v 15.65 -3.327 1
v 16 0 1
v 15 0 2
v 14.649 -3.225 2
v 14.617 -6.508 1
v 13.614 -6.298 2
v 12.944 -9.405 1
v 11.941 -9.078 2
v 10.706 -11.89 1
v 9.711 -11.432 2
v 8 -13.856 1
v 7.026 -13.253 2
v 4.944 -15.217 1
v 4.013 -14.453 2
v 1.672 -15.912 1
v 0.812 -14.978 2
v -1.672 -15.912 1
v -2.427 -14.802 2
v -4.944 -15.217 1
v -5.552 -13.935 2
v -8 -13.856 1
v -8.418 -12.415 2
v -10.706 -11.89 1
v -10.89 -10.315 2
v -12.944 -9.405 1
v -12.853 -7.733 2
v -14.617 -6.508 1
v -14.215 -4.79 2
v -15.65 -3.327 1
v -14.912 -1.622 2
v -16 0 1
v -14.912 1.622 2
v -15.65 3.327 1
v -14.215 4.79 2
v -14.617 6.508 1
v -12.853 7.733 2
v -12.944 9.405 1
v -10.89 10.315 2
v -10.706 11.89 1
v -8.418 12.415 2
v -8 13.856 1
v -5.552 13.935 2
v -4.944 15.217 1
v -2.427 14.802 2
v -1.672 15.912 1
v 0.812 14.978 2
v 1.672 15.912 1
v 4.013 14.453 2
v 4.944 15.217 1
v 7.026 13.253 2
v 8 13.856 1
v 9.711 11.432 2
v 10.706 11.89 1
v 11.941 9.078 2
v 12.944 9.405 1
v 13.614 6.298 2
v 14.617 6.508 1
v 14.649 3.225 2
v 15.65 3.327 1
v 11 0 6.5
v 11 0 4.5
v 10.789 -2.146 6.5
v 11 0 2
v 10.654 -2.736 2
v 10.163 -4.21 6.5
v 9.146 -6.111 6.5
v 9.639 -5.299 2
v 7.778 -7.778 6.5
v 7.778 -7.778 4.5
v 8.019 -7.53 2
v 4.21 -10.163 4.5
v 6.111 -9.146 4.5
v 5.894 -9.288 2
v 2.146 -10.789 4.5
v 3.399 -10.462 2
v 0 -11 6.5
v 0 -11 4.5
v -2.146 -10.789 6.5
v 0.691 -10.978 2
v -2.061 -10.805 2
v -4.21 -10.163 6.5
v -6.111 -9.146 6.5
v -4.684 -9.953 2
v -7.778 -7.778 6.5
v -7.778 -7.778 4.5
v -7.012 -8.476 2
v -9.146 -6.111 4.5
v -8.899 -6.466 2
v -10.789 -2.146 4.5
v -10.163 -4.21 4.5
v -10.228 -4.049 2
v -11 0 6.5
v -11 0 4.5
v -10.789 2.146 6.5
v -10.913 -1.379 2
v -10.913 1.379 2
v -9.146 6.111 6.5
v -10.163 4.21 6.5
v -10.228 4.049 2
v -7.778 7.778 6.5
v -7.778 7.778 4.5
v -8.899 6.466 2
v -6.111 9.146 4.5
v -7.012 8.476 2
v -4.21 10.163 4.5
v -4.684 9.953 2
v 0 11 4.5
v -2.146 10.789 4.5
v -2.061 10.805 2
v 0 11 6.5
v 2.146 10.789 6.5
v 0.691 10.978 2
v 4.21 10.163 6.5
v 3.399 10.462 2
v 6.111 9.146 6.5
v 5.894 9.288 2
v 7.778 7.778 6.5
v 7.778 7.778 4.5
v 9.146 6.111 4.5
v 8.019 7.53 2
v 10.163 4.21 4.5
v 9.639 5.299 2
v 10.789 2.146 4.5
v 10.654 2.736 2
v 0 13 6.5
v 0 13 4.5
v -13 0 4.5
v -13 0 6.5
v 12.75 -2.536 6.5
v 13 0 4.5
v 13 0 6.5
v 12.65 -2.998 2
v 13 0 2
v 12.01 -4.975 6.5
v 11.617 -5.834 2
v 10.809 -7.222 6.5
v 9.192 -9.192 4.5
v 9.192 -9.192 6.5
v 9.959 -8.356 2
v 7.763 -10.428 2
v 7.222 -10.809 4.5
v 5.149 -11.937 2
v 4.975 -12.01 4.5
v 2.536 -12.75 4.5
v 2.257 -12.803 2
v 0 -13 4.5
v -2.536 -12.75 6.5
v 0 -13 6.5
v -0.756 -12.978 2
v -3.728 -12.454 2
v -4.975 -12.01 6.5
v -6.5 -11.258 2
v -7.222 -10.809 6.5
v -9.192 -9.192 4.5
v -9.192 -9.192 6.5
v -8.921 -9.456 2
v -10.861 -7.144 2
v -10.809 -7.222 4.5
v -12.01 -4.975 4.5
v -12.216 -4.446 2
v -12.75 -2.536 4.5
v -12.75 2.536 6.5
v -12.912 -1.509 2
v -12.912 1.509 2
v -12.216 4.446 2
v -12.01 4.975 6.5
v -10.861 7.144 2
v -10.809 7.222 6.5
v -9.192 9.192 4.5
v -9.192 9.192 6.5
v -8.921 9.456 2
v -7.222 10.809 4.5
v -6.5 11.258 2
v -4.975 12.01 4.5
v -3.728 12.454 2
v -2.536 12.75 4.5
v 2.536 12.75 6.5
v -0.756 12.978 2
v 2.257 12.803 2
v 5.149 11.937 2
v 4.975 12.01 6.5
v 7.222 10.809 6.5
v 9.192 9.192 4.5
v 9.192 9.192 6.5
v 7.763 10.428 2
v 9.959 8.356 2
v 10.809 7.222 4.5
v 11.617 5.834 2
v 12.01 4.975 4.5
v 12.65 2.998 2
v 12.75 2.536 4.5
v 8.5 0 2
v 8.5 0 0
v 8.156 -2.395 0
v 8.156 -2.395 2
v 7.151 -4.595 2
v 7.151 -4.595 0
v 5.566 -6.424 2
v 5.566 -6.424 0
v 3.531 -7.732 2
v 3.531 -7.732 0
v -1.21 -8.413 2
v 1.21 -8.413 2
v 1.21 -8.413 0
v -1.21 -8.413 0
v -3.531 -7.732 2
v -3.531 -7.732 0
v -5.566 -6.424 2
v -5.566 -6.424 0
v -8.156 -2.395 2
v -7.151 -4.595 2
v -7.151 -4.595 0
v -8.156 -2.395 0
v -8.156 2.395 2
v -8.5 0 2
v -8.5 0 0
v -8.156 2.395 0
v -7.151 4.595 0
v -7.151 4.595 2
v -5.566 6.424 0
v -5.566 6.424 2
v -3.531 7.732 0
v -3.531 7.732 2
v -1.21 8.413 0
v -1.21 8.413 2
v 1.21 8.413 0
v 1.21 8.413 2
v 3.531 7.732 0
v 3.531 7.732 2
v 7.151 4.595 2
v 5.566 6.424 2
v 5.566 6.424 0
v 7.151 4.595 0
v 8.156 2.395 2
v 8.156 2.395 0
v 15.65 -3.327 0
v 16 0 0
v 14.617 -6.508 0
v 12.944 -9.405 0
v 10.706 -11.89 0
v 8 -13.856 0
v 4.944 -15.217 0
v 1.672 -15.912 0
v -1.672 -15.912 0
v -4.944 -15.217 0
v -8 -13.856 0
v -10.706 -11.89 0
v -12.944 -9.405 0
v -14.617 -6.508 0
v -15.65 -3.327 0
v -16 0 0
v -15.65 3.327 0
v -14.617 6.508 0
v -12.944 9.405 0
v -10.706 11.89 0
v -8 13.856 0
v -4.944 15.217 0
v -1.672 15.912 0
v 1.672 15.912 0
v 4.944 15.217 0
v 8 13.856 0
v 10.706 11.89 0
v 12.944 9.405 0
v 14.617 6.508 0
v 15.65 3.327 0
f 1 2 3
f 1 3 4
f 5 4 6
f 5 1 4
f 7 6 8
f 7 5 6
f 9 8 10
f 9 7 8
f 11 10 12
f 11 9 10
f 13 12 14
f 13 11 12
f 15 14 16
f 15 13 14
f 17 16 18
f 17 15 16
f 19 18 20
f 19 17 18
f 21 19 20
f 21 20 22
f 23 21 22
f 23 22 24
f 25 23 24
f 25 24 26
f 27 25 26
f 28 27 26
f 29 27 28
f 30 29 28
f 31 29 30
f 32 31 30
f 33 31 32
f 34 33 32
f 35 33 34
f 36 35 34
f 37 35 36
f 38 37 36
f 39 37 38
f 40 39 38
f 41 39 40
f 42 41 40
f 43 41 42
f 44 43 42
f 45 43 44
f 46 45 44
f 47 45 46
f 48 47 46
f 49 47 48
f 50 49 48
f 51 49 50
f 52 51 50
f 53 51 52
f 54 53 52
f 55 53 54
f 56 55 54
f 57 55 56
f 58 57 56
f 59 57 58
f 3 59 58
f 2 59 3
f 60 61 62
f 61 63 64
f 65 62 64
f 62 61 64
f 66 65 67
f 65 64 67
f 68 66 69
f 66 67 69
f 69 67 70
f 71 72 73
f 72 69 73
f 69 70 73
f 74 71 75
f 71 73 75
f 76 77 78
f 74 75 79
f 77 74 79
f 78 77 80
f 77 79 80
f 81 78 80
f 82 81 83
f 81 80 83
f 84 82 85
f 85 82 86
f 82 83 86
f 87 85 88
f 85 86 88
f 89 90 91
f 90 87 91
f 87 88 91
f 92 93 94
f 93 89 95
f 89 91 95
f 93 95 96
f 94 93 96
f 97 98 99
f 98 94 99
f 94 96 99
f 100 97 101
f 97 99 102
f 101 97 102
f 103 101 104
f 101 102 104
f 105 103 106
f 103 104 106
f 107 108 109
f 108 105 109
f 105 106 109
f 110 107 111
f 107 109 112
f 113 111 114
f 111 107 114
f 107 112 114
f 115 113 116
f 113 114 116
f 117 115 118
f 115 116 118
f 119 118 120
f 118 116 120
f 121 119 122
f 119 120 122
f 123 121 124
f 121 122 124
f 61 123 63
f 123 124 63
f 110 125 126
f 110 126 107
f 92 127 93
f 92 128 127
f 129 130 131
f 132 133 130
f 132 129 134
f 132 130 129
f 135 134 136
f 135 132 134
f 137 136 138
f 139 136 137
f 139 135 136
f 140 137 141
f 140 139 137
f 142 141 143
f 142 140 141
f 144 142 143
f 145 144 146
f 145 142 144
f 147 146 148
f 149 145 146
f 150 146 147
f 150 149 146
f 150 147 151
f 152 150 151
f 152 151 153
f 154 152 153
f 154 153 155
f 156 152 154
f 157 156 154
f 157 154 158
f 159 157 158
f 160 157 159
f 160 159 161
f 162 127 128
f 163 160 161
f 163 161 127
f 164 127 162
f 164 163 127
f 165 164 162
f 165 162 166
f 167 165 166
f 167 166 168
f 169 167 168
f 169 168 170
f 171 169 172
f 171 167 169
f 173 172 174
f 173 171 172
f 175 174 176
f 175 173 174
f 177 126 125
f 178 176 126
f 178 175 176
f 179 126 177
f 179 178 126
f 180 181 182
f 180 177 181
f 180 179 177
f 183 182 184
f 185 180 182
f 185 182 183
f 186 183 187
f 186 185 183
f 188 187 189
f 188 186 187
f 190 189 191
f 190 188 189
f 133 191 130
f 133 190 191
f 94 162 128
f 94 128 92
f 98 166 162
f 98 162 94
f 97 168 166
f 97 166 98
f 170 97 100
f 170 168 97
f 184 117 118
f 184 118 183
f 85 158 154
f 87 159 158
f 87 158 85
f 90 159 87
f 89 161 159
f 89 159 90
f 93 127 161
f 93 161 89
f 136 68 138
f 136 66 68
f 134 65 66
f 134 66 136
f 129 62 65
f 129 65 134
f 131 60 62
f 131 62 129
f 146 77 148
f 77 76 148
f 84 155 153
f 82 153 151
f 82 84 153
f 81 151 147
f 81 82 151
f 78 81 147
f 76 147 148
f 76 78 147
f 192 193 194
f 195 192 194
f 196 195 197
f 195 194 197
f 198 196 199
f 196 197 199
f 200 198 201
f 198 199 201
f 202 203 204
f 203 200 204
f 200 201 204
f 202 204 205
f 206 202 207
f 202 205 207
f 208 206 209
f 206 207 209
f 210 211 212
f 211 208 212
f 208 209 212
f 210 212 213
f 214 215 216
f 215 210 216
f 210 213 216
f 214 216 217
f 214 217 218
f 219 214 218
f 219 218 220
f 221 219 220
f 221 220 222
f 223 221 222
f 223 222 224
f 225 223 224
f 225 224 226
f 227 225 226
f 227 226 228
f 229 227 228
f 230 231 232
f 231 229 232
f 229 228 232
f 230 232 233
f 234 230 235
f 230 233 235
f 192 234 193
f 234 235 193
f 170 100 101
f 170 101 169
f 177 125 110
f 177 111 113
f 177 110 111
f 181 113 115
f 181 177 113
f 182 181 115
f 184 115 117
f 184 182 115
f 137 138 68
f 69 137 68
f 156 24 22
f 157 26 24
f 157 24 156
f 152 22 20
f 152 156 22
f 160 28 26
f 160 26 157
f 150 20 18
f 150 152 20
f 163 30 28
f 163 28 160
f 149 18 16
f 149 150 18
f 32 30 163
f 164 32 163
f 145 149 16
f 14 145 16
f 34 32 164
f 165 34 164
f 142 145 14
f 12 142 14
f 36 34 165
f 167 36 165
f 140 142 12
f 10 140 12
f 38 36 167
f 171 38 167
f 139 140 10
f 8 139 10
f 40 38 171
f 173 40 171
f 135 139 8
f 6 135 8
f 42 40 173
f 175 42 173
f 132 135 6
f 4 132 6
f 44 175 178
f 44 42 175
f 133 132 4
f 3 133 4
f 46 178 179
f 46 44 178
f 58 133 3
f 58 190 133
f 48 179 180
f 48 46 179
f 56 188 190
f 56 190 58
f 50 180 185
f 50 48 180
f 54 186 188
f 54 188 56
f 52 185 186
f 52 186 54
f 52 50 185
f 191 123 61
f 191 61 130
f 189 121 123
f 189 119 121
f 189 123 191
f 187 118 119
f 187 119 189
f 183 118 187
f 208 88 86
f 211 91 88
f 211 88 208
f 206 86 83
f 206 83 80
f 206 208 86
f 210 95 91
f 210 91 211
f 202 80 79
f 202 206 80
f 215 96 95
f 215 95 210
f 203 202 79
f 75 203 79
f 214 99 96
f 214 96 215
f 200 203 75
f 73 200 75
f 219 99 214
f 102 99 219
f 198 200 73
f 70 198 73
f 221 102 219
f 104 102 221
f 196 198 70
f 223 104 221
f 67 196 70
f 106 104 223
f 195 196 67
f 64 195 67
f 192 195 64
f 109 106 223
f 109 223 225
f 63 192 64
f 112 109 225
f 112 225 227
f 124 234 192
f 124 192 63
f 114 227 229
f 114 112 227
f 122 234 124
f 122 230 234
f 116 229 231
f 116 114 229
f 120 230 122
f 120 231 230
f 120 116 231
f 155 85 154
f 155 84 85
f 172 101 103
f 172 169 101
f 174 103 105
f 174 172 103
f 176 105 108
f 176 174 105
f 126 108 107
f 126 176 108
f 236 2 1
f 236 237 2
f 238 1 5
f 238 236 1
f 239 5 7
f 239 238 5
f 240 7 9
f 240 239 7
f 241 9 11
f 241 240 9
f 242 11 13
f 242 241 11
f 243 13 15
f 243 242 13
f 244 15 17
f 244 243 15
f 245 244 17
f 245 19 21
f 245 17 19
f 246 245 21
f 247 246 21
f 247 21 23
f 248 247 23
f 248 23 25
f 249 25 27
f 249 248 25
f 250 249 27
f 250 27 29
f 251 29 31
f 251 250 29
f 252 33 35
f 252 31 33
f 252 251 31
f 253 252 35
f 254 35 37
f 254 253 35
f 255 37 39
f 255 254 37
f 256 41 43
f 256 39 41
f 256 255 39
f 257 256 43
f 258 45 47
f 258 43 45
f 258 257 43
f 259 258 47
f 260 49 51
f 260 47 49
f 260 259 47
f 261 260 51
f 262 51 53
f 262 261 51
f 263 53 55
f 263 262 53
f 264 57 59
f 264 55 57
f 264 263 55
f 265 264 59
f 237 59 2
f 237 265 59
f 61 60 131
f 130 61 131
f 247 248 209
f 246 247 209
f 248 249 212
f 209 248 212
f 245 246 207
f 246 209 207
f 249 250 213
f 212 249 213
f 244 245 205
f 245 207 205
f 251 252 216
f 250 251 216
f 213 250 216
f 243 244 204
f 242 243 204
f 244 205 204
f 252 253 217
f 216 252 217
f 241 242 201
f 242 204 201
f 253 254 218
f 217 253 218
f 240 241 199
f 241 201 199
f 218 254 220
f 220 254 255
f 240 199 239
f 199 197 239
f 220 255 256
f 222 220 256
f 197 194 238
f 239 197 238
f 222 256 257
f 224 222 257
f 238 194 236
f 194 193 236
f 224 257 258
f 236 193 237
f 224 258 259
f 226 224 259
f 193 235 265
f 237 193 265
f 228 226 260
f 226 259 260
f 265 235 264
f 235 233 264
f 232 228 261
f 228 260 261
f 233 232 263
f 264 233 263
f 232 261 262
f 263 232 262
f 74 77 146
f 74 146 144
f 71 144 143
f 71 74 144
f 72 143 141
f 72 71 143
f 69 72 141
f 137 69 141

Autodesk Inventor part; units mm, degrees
ref_plane "YZ Plane" through (0, 0, 0) normal (1, 0, 0) x (0, 1, 0)
ref_plane "XZ Plane" through (0, 0, 0) normal (0, 1, 0) x (-1, 0, 0)
ref_plane "XY Plane" through (0, 0, 0) normal (0, 0, 1) x (1, 0, 0)
sketch "Sketch1" plane through (0, 0, 0) normal (0, 0, 1) x (1, 0, 0)
  circle A0 centre (0, 0) radius 16
  circle A1 centre (0, 0) radius 8.5
  dimension "d0" = 32
  dimension "d1" = 17
extrude "Extrusion1" add sketch "Sketch1" along normal blind 2
sketch "Sketch2" plane through (0, 0, 2) normal (0, 0, 1) x (1, 0, 0)
  circle A0 centre (0, 0) radius 16 projected
  circle A1 centre (0, 0) radius 11
  circle A2 centre (0, 0) radius 13
  dimension "d4" = 22
  dimension "d5" = 26
extrude "Extrusion2" add sketch "Sketch2" along normal blind 4.5 contours A2
sketch "Sketch3" plane through (0, 0, 6.5) normal (0, 0, 1) x (1, 0, 0)
  circle A0 centre (0, 0) radius 11 projected
  circle A1 centre (0, 0) radius 13 projected
  line L0 (-13, 0) -> (13, 0) construction
  line L1 (0, 13) -> (0, -13) construction
  line L2 (-9.1924, 9.1924) -> (9.1924, -9.1924) construction
  line L3 (9.1924, 9.1924) -> (-9.1924, -9.1924) construction
  circle A2 centre (0, 0) radius 13
  circle A3 centre (0, 0) radius 11
  line L4 (-13, 0) -> (-11, 0)
  line L5 (-7.7782, 7.7782) -> (-9.1924, 9.1924)
  line L6 (0, 13) -> (0, 11)
  line L7 (7.7782, 7.7782) -> (9.1924, 9.1924)
  line L8 (11, 0) -> (13, 0)
  line L9 (9.1924, -9.1924) -> (7.7782, -7.7782)
  line L10 (0, -11) -> (0, -13)
  line L11 (-7.7782, -7.7782) -> (-9.1924, -9.1924)
  dimension "d8" = 45
  dimension "d9" = 45
extrude "Extrusion3" cut sketch "Sketch3" against normal blind 2 contours A0 L7 A1 L8 | L9 A1 L10 A0 | A0 L5 A1 L6 | L11 A1 L4 A0
chamfer "Chamfer1" distance 1 angle 45 1 edges at (-16, 0, 2)
properties part number "belt_guide" material "ABS Plastic"
